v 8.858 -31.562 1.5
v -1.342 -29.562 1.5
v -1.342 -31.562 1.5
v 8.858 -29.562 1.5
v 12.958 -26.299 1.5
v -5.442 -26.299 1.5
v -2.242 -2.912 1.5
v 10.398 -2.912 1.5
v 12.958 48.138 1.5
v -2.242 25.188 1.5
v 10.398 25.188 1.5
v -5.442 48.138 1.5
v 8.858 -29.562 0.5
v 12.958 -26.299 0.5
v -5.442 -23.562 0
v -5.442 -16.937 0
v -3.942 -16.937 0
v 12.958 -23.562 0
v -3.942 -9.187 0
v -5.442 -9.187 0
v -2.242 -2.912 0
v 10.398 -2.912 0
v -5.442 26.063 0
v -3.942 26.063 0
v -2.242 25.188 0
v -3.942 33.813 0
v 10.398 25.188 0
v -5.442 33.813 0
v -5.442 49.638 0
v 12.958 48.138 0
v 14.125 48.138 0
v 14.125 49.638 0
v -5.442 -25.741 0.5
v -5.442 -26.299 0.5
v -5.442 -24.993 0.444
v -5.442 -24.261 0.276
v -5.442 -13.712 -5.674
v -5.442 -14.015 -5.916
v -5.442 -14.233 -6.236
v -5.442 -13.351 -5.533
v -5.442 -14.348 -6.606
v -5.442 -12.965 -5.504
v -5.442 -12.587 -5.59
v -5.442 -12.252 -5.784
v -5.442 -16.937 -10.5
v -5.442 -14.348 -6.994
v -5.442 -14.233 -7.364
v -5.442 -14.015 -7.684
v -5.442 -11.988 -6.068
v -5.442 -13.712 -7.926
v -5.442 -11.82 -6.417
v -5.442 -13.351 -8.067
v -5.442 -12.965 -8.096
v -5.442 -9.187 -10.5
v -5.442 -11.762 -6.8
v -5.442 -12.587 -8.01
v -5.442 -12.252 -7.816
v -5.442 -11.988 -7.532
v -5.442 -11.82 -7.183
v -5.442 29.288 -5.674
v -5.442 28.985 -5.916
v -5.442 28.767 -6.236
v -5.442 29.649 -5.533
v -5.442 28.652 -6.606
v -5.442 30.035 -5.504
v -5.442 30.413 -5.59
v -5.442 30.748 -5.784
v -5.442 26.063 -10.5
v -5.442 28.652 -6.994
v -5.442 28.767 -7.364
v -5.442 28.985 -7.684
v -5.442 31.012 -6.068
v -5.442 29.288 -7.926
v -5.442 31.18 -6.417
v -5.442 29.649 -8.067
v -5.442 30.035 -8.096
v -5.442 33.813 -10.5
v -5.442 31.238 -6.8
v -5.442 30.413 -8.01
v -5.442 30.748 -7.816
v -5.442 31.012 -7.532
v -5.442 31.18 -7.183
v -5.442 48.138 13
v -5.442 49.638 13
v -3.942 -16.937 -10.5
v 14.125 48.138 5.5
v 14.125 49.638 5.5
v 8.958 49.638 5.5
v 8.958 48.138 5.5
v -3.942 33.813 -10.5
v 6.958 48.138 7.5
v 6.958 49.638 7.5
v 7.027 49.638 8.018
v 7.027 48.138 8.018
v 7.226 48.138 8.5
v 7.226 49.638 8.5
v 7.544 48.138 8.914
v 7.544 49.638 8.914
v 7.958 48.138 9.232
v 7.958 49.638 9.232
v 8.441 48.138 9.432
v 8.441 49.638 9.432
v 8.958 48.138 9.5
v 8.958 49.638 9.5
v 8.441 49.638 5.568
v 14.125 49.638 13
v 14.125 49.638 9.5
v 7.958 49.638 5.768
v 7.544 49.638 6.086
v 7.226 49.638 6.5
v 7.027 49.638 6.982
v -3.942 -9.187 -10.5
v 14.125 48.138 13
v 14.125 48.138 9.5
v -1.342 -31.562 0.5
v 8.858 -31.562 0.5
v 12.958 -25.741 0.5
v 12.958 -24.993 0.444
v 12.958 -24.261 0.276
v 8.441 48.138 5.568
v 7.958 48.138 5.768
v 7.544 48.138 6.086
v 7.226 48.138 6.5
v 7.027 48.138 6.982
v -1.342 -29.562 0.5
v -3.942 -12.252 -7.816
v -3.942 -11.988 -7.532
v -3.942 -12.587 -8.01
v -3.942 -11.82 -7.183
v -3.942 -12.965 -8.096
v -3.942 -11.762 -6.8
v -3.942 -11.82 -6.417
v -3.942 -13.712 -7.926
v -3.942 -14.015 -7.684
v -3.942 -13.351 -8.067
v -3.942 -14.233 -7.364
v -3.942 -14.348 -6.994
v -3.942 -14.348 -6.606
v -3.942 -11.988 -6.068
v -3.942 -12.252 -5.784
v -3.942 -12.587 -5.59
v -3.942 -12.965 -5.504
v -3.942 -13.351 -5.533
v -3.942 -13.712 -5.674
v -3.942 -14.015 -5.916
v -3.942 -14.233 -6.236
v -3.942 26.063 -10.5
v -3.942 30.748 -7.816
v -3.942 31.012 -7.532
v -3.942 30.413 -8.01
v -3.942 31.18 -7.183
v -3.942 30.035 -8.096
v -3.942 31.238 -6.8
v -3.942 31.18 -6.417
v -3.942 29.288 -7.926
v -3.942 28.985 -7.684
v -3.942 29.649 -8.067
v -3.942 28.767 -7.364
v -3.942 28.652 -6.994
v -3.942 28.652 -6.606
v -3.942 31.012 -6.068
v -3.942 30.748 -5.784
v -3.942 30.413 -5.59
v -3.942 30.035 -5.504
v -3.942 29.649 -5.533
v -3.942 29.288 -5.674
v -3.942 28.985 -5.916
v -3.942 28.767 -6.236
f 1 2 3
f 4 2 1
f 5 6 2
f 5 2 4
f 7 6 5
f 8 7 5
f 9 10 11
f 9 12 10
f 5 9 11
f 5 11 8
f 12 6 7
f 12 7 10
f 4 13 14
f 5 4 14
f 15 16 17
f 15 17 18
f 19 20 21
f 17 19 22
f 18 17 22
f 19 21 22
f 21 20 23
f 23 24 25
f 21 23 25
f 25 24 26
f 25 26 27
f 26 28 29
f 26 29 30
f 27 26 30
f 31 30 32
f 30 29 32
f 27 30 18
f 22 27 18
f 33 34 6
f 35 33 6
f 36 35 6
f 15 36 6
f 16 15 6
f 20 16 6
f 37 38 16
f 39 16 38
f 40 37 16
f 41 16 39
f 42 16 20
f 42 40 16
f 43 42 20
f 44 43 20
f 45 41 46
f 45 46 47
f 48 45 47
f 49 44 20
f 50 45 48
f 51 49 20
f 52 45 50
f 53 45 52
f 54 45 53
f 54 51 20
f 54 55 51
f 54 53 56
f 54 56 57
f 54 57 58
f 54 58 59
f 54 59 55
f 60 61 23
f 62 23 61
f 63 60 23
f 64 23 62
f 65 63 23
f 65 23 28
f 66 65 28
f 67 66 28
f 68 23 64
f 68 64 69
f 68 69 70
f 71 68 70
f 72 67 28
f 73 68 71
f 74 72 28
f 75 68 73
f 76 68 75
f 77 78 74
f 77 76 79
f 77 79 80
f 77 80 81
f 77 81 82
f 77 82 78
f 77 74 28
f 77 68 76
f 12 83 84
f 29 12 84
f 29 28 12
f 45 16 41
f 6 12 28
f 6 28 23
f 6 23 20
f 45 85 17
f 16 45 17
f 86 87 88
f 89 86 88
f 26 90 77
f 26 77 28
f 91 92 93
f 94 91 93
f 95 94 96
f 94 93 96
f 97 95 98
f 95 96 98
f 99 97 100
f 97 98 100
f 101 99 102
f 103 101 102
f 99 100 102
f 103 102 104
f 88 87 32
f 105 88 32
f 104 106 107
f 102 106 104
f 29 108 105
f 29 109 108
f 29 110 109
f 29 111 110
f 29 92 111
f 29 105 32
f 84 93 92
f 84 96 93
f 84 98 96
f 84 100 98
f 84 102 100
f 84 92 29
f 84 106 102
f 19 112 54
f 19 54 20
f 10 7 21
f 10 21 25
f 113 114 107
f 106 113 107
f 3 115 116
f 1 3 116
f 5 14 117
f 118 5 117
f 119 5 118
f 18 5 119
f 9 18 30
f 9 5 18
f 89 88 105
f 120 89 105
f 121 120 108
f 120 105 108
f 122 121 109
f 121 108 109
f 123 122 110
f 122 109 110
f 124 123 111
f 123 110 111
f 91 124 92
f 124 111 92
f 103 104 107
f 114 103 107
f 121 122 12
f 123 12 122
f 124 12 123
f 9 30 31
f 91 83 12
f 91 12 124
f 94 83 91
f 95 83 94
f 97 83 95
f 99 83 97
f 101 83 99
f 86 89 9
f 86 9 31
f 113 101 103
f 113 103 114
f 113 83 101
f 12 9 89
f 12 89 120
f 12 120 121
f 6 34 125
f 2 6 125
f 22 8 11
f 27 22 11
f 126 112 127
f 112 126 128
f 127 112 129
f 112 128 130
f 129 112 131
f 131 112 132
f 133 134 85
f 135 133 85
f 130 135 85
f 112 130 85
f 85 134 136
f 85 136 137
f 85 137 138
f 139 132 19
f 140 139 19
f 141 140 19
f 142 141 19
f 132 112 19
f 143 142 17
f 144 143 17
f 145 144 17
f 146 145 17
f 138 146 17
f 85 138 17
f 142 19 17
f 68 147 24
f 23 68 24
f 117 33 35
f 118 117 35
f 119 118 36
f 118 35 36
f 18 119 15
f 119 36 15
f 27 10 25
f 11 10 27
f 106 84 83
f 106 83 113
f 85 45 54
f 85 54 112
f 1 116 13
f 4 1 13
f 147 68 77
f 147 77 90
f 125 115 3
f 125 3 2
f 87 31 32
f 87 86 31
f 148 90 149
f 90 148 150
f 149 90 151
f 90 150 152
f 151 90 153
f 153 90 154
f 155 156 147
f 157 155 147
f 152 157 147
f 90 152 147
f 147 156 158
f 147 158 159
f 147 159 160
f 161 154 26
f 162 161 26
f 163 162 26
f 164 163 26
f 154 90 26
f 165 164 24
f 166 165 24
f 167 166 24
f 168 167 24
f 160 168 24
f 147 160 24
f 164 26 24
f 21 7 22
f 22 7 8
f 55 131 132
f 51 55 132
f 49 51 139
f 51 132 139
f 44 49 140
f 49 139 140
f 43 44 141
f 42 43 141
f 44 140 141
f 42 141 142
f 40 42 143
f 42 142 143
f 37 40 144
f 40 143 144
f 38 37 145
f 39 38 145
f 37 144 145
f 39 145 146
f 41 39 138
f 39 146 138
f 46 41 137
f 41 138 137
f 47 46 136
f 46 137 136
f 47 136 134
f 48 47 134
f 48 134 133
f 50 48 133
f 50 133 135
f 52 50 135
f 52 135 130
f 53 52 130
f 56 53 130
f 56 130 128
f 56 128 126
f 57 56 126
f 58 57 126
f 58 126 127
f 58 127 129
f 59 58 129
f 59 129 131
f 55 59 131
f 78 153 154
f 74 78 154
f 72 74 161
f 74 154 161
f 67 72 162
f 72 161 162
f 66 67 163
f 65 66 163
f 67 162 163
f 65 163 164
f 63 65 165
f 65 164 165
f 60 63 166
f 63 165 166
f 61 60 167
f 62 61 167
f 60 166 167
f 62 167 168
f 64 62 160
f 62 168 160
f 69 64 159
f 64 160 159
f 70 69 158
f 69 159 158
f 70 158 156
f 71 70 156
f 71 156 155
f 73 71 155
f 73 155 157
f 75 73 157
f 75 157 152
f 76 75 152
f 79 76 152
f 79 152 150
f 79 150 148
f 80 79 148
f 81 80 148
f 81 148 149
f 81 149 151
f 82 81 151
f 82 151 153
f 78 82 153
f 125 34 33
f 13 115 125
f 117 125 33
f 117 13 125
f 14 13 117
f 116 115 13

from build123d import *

# Parameters (mm, degrees)
F0_W         = 10.2
F0_H         = 2
F1_DEPTH     = 1.5
F2_W         = 12.64
F2_H         = 28.1
F3_DEPTH     = 25
F4_W         = 1.5
F4_H         = 75.9369339572
F5_DEPTH     = 10.5
F6_W         = 35.25
F6_H         = 10.5
F6_R         = 1.3
F6_W_2       = 15.825
F6_W_3       = 9.3619339572
F7_DEPTH     = 25
F9_DEPTH     = 0.5
F10_T1_DEPTH = 18.4
F11_W        = 18.4
F11_H        = 1.5
F11_W_2      = 1.1665335146
F12_DEPTH    = 11.5
F14_DEPTH    = 1.5
F15_DEPTH    = 1.5


# Not quite as in the source:
# - a fillet or chamfer that OpenCascade refuses, or shapes differently, is made with other operations: its cross-section is extruded or revolved along the edge and cut away or added


with BuildPart() as f1:
    # F0 (on Top) → F1 (new body)
    with BuildSketch(Plane.XY):
        Polygon((12.9583973216, 49.6379526287), (-5.4416026784, 49.6379526287), (-5.4416026784, -26.2989813285), (-1.3416026784, -29.5620473713), (8.8583973216, -29.5620473713), (12.9583973216, -26.2989813285), align=None)
        with Locations((3.7583973216, -30.5620473713)):
            Rectangle(F0_W, F0_H)
    extrude(amount=F1_DEPTH)

    # F2 (on face) → F3 (cut)
    with BuildSketch(Plane.XY.offset(1.5)):
        with Locations((4.0783973216, 11.1379526287)):
            Rectangle(F2_W, F2_H)
    extrude(amount=-F3_DEPTH, mode=Mode.SUBTRACT)

    # F4 (on face) → F5 (join)
    with BuildSketch(Plane(origin=(0, 0, 0), x_dir=(1, 0, 0), z_dir=(0, 0, -1))):
        with Locations((-4.6916026784, -11.6694856501)):
            Rectangle(F4_W, F4_H)
    extrude(amount=F5_DEPTH)

    # F6 (on face) → F7 (cut)
    with BuildSketch(Plane.YZ.offset(-3.9416026784)):
        with Locations((8.4379526287, -5.25)):
            Rectangle(F6_W, F6_H)
        with Locations((-13.0620473713, -6.8)):
            Circle(F6_R)
        with Locations((29.9379526287, -6.8)):
            Circle(F6_R)
        with Locations((41.7254526287, -5.25)):
            Rectangle(F6_W_2, F6_H)
        with Locations((-21.6180143499, -5.25)):
            Rectangle(F6_W_3, F6_H)
    extrude(amount=-F7_DEPTH, mode=Mode.SUBTRACT)

    # F8 (on face) → F9 (cut)
    with BuildSketch(Plane(origin=(0, 0, 0), x_dir=(1, 0, 0), z_dir=(0, 0, -1))):
        Polygon((-5.4416026784, 26.2989813285), (-5.4416026784, 23.5620473713), (12.9583973216, 23.5620473713), (12.9583973216, 26.2989813285), (8.8583973216, 29.5620473713), (8.8583973216, 31.5620473713), (-1.3416026784, 31.5620473713), (-1.3416026784, 29.5620473713), align=None)
    extrude(amount=-F9_DEPTH, mode=Mode.SUBTRACT)

    # F10: fillet of radius 5 on 1 edges, made by hand

    # F10_s2 → F10_t1 (join)
    with BuildSketch(Plane.YZ.offset(-5.4416026784)):
        with BuildLine():
            ThreePointArc((-25.7414968431, 0.5), (-24.6234628544, 0.3733971724), (-23.5620473713, 0))
            Line((-23.5620473713, 0), (-23.5620473713, 0.5))
            Line((-23.5620473713, 0.5), (-25.7414968431, 0.5))
        make_face()
    extrude(amount=F10_T1_DEPTH)

    # F11 (on face) → F12 (join)
    with BuildSketch(Plane.XY.offset(1.5)):
        with Locations((3.7583973216, 48.8879526287)):
            Rectangle(F11_W, F11_H)
        with Locations((13.5416640789, 48.8879526287)):
            Rectangle(F11_W_2, F11_H)
    extrude(amount=F12_DEPTH)

    # F13 (on face) → F14 (cut, through all)
    with BuildSketch(Plane(origin=(0, 49.6379526287, 0), x_dir=(-1, 0, 0), z_dir=(0, 1, 0))):
        with BuildLine():
            Line((-12.9583973216, 9.5), (-14.1249308363, 9.5))
            Line((-14.1249308363, 9.5), (-14.1249308363, 5.5))
            Line((-14.1249308363, 5.5), (-12.9583973216, 5.5))
            Line((-12.9583973216, 5.5), (-8.9583973216, 5.5))
            ThreePointArc((-8.9583973216, 5.5), (-10.9583973216, 7.5), (-8.9583973216, 9.5))
            Line((-8.9583973216, 9.5), (-12.9583973216, 9.5))
        make_face()
        with BuildLine():
            ThreePointArc((-6.9583973216, 7.5), (-7.5441837593, 8.9142135624), (-8.9583973216, 9.5))
            ThreePointArc((-8.9583973216, 9.5), (-10.9583973216, 7.5), (-8.9583973216, 5.5))
            ThreePointArc((-8.9583973216, 5.5), (-7.5441837593, 6.0857864376), (-6.9583973216, 7.5))
        make_face()
    extrude(amount=-F14_DEPTH, mode=Mode.SUBTRACT)

    # F15 (add, through all): a face of the model
    f15_faces = [f1.faces().sort_by_distance(p)[0] for p in [
        (13.5416640789, 48.8879526287, 1.5),
    ]]
    extrude(f15_faces, amount=F15_DEPTH)


solid = f1.part
